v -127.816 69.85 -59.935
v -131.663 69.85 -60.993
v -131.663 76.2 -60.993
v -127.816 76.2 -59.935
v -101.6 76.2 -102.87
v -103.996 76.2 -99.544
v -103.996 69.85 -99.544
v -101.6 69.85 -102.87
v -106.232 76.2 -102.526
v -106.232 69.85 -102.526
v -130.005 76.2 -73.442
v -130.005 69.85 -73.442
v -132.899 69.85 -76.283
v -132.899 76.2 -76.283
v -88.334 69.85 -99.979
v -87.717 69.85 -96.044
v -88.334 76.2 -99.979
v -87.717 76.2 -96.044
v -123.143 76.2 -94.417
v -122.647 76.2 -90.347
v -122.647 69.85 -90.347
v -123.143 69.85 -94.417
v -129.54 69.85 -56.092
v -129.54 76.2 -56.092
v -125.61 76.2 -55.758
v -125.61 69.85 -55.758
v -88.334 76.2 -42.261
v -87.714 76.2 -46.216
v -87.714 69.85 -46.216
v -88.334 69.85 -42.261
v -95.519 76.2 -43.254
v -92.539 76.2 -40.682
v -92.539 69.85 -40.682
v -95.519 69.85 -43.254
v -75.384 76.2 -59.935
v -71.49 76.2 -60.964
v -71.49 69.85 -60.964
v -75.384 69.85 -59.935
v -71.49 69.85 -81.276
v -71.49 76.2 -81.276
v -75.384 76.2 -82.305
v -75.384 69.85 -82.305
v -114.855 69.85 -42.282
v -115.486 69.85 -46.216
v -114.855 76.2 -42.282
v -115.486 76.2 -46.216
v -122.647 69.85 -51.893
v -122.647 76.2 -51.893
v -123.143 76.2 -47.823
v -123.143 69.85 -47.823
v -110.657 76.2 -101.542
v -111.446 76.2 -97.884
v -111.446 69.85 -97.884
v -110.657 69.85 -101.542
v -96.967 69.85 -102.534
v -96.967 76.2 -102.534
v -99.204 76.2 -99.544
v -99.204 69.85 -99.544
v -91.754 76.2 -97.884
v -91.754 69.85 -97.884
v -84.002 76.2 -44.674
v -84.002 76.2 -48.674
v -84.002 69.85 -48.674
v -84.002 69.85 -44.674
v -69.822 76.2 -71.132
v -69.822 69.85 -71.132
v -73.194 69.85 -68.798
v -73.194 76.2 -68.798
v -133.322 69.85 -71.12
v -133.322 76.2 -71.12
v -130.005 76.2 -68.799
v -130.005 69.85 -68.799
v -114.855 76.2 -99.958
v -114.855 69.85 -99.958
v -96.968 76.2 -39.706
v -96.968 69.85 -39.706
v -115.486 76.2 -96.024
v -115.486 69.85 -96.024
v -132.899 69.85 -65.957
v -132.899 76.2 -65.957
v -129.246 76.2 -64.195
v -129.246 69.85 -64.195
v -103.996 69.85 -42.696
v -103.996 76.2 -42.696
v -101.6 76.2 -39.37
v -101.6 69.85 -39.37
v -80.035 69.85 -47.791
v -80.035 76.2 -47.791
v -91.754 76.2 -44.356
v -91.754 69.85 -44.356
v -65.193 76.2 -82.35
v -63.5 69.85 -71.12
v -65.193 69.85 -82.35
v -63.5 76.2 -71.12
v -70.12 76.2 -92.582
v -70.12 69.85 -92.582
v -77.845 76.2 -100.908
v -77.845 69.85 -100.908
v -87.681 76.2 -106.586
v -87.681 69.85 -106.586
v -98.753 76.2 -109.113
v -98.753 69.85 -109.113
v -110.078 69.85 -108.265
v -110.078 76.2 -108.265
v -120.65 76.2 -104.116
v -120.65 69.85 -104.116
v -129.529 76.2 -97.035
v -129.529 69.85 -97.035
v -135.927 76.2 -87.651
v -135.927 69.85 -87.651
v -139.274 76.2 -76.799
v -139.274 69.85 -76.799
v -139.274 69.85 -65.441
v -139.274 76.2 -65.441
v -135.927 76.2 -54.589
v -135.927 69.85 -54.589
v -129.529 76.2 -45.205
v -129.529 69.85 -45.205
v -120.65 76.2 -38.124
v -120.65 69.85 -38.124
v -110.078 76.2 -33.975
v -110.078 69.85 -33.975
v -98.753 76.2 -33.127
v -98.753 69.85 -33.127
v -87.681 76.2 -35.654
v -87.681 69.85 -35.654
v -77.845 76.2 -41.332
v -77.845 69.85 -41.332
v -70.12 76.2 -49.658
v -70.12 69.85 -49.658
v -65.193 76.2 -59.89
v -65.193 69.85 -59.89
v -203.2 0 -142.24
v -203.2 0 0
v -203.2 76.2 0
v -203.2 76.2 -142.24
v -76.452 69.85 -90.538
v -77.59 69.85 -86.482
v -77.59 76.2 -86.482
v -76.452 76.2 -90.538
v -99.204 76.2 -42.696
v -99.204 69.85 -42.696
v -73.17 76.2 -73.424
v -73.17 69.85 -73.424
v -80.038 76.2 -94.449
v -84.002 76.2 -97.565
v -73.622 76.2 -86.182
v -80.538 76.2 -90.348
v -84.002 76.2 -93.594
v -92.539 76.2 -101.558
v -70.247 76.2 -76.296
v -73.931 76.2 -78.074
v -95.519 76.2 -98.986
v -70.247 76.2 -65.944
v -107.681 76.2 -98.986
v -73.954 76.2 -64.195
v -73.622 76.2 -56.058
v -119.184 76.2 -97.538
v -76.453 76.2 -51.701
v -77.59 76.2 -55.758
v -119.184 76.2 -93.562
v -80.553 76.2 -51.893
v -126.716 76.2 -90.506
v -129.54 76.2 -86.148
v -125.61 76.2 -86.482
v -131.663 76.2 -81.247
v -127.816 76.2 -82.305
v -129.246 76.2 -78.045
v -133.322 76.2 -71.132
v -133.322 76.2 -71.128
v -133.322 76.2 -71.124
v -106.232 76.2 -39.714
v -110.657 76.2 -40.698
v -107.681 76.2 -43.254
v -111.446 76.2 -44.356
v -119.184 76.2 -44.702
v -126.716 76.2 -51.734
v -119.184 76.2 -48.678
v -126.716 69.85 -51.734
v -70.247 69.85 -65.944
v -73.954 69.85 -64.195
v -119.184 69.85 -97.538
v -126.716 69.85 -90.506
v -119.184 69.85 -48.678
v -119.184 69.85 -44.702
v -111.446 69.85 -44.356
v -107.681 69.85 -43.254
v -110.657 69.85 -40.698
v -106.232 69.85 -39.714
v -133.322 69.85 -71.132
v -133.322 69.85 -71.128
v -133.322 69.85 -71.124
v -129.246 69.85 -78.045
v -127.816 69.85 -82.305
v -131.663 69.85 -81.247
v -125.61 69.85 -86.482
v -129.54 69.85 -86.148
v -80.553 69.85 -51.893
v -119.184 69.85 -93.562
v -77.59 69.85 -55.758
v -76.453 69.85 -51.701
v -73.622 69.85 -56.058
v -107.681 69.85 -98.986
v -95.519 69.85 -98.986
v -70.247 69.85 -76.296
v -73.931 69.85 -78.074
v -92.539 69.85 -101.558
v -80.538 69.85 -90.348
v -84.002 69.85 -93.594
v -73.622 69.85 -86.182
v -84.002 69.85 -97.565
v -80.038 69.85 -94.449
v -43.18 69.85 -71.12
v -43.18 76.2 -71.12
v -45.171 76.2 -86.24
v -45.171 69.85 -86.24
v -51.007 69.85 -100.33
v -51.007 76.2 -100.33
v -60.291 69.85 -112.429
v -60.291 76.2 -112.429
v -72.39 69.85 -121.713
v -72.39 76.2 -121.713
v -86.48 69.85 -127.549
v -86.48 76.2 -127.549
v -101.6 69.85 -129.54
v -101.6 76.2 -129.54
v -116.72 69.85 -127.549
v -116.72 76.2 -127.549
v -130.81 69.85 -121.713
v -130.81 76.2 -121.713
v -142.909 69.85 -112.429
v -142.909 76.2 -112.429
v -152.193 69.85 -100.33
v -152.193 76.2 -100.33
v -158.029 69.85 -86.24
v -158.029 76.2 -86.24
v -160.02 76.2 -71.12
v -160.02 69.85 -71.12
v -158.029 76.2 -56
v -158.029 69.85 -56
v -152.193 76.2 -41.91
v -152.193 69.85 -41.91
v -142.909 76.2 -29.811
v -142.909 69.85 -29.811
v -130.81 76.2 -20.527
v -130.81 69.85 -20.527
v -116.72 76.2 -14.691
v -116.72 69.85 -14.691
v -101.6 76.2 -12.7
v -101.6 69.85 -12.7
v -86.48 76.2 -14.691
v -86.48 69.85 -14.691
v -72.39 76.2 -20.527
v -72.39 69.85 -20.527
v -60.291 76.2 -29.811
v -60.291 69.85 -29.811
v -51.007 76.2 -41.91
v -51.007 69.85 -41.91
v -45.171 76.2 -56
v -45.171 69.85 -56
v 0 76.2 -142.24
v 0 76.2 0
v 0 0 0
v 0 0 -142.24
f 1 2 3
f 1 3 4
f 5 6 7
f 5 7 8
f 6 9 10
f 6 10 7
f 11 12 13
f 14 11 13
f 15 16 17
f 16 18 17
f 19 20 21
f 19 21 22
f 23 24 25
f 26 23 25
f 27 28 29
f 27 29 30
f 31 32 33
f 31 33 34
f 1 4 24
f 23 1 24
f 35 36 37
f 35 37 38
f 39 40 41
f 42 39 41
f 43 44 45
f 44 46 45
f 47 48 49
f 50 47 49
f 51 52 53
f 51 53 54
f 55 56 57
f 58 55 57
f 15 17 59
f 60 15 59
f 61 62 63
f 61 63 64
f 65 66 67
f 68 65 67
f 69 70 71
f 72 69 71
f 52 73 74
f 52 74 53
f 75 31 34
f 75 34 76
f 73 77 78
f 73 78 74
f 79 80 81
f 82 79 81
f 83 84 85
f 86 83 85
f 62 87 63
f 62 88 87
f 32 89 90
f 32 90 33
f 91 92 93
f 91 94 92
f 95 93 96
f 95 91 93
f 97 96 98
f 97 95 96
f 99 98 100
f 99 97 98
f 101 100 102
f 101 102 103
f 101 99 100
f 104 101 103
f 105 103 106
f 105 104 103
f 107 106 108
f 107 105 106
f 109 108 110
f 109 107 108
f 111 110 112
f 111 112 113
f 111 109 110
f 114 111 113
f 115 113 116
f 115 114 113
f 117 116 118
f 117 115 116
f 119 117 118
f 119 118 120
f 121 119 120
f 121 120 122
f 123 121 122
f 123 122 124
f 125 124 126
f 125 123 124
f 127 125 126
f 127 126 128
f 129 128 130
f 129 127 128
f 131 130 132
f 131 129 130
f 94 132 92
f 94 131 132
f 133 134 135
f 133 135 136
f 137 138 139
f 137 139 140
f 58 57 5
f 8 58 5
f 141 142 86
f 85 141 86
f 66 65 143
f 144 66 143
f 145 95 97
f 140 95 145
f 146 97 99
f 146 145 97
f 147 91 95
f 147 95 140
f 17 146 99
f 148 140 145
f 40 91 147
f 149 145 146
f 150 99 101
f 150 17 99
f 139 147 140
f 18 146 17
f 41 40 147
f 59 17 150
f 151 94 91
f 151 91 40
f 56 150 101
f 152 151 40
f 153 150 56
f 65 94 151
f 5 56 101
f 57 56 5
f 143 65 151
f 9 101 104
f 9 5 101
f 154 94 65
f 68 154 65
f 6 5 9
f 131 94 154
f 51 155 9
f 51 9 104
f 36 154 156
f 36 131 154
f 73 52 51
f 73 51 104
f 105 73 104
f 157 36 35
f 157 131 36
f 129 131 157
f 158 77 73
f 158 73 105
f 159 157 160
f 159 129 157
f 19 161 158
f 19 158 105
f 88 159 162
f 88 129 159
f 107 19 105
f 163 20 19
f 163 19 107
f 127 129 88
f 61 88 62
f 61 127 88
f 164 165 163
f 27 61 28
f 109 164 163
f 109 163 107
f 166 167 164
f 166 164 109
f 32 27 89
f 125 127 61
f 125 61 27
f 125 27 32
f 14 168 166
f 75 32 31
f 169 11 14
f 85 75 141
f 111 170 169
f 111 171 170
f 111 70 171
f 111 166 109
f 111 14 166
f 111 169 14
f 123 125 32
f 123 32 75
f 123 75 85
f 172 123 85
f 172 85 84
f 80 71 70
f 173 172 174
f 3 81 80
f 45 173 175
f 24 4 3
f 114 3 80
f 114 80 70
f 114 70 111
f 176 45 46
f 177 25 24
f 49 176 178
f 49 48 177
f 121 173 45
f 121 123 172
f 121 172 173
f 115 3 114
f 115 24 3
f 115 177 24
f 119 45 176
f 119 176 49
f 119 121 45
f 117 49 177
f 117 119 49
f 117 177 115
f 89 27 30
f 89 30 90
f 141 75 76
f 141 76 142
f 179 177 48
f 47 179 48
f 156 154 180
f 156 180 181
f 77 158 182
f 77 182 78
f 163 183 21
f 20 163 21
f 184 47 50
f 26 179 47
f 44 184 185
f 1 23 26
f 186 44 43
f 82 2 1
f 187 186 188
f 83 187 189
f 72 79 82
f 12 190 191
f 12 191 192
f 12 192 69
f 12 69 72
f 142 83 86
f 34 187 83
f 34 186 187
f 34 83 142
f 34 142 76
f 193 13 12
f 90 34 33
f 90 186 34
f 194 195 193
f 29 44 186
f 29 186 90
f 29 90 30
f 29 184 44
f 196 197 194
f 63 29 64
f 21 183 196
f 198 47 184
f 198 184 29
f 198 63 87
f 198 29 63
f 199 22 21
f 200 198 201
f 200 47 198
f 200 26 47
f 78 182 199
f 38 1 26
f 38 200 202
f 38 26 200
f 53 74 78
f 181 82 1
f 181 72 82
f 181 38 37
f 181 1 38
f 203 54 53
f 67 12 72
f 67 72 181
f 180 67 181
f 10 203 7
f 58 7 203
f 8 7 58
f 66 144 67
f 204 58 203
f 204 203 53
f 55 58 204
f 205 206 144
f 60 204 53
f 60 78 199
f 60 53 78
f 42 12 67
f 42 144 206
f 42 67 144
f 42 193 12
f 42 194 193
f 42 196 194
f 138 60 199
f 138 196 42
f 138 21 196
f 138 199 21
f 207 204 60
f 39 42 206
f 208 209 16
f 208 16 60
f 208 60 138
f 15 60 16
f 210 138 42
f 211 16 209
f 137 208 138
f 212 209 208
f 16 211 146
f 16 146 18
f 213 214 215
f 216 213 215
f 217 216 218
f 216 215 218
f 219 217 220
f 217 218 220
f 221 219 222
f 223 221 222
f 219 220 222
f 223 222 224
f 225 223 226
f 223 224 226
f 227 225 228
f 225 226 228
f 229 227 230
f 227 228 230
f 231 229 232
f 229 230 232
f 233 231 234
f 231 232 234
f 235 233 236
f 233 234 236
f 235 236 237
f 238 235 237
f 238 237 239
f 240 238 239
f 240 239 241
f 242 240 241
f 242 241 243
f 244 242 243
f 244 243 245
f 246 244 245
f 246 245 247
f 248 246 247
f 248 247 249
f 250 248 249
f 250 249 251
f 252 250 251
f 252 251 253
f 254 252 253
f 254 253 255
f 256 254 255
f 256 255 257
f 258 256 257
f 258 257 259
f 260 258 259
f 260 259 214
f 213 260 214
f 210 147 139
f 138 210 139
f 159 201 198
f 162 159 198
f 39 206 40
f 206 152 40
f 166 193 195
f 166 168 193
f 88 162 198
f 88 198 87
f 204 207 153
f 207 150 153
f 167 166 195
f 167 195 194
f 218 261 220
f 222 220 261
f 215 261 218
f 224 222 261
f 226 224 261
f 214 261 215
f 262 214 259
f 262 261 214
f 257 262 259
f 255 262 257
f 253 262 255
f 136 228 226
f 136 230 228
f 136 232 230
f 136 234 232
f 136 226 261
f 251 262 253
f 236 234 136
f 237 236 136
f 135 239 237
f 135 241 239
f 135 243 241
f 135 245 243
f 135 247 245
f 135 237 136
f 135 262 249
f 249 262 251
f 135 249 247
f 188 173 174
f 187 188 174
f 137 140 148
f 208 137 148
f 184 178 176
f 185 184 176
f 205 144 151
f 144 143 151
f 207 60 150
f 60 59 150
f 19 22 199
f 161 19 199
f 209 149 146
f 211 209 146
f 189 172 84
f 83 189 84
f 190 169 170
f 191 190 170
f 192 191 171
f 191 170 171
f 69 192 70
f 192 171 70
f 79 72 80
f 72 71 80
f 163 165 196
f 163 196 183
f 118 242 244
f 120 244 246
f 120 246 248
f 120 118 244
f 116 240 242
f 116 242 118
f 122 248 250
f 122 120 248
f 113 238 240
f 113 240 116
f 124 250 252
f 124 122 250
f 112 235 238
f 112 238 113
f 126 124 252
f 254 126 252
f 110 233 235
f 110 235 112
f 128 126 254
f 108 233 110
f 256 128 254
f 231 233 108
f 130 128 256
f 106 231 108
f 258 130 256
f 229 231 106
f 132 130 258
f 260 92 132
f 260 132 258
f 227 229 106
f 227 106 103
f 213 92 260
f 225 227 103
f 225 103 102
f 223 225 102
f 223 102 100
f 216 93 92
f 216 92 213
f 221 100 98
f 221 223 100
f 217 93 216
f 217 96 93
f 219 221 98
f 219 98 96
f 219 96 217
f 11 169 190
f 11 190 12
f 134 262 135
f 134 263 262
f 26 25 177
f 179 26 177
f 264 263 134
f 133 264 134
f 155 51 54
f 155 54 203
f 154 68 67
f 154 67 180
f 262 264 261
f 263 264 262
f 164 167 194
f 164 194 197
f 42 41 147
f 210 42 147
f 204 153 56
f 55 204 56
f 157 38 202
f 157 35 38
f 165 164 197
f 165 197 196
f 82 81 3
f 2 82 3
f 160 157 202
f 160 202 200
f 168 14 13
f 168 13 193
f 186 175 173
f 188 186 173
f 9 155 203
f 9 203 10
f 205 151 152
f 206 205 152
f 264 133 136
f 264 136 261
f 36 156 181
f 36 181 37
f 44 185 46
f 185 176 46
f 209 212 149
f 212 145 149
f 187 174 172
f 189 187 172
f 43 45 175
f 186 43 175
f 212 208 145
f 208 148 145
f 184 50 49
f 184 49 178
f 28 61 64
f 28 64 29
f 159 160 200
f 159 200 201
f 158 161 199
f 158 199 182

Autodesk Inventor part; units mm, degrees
ref_plane "YZ Plane" through (0, 0, 0) normal (1, 0, 0) x (0, 1, 0)
ref_plane "XZ Plane" through (0, 0, 0) normal (0, 1, 0) x (-1, 0, 0)
ref_plane "XY Plane" through (0, 0, 0) normal (0, 0, 1) x (1, 0, 0)
sketch "Sketch1" plane through (0, 0, 0) normal (0, 1, 0) x (-1, 0, 0)
  line L0 (0, 0) -> (203.2, 0)
  line L1 (203.2, 0) -> (203.2, -142.24)
  line L2 (203.2, -142.24) -> (0, -142.24)
  line L3 (0, -142.24) -> (0, 0)
  dimension "d0" = 203.2
  dimension "d1" = 142.24
extrude "Extrusion1" add sketch "Sketch1" along normal blind 76.2
sketch "Sketch2" plane through (0, 76.2, 0) normal (0, 1, 0) x (1, 0, 0)
  line L0 (-203.2, 0) -> (0, 0) projected
  line L1 (-203.2, 0) -> (-203.2, 71.12)
  line L2 (-203.2, 142.24) -> (-203.2, 0) projected
  line L3 (0, 0) -> (0, 142.24) projected
  line L4 (0, 0) -> (-101.6, 0)
  circle A0 centre (-101.6, 71.12) radius 38.1
  circle A1 centre (-101.6, 71.12) radius 58.42
  circle A2 centre (-101.6, 71.12) radius 31.75
  line L5 (0, 142.24) -> (-203.2, 142.24) projected
  dimension "d4" = 71.12
  dimension "d6" = 101.6
  dimension "d7" = 76.2
  dimension "d8" = 116.84
  dimension "d9" = 63.5
  dimension "d10" = 71.12
extrude "Extrusion2" cut sketch "Sketch2" against normal blind 6.35 contours A1
sketch "Sketch3" plane through (0, 76.2, 0) normal (0, 1, 0) x (1, 0, 0)
  line L0 (0, 0) -> (-101.6, 0)
  line L1 (-203.2, 0) -> (0, 0) projected
  line L2 (0, 142.24) -> (-203.2, 142.24) projected
  line L3 (0, 0) -> (0, 142.24) projected
  circle A0 centre (-101.5719, 71.12) radius 31.75
  line L4 (-133.3219, 71.12) -> (-129.54, 71.12) construction
  line L5 (-130.036, 73.0239) -> (-126.4684, 73.0239) construction
  line L6 (-133.3219, 71.12) -> (-130.0051, 68.7994)
  line L7 (-130.0051, 68.7994) -> (-132.8994, 65.9574)
  line L8 (-133.3219, 71.1322) -> (-130.005, 73.442)
  line L9 (-130.005, 73.442) -> (-132.8994, 76.2826)
  line L10 (-132.8994, 76.2826) -> (-129.2464, 78.0447)
  line L11 (-129.2464, 78.0447) -> (-131.6634, 81.2473)
  line L12 (-131.6634, 81.2473) -> (-127.8155, 82.305)
  line L13 (-127.8155, 82.305) -> (-129.54, 86.1483)
  line L14 (-129.54, 86.1483) -> (-125.61, 86.4823)
  line L15 (-125.61, 86.4823) -> (-126.7161, 90.5064)
  line L16 (-126.7161, 90.5064) -> (-122.6466, 90.3473)
  line L17 (-122.6466, 90.3473) -> (-123.1432, 94.4168)
  line L18 (-123.1432, 94.4168) -> (-119.1835, 93.5625)
  line L19 (-119.1835, 93.5625) -> (-119.1835, 97.5377)
  line L20 (-119.1835, 97.5377) -> (-115.486, 96.0244)
  line L21 (-115.486, 96.0244) -> (-114.8554, 99.9577)
  line L22 (-114.8554, 99.9577) -> (-111.4463, 97.8843)
  line L23 (-111.4463, 97.8843) -> (-110.657, 101.5424)
  line L24 (-110.657, 101.5424) -> (-107.6807, 98.986)
  line L25 (-107.6807, 98.986) -> (-106.2317, 102.5262)
  line L26 (-106.2317, 102.5262) -> (-103.9961, 99.5445)
  line L27 (-103.9961, 99.5445) -> (-101.6, 102.87)
  line L28 (-130.005, 68.798) -> (-132.8994, 65.9574)
  line L29 (-132.8994, 65.9574) -> (-129.2464, 64.1953)
  line L30 (-129.2464, 64.1953) -> (-131.6634, 60.9927)
  line L31 (-131.6634, 60.9927) -> (-127.8155, 59.935)
  line L32 (-127.8155, 59.935) -> (-129.54, 56.0917)
  line L33 (-129.54, 56.0917) -> (-125.61, 55.7577)
  line L34 (-125.61, 55.7577) -> (-126.7161, 51.7336)
  line L35 (-126.7161, 51.7336) -> (-122.6466, 51.8927)
  line L36 (-122.6466, 51.8927) -> (-123.1432, 47.8232)
  line L37 (-123.1432, 47.8232) -> (-119.1835, 48.6775)
  line L38 (-119.1835, 48.6775) -> (-119.1835, 44.7023)
  line L39 (-119.1835, 44.7023) -> (-115.486, 46.2156)
  line L40 (-115.486, 46.2156) -> (-114.8554, 42.2823)
  line L41 (-114.8554, 42.2823) -> (-111.4463, 44.3557)
  line L42 (-111.4463, 44.3557) -> (-110.657, 40.6976)
  line L43 (-110.657, 40.6976) -> (-107.6807, 43.254)
  line L44 (-107.6807, 43.254) -> (-106.2317, 39.7138)
  line L45 (-106.2317, 39.7138) -> (-103.9961, 42.6955)
  line L46 (-103.9961, 42.6955) -> (-101.6, 39.37)
  line L47 (-73.1943, 68.7985) -> (-70.2466, 65.9445)
  line L48 (-69.8219, 71.1322) -> (-73.1695, 73.4245)
  line L49 (-73.1695, 73.4245) -> (-70.2466, 76.2955)
  line L50 (-70.2466, 76.2955) -> (-73.9311, 78.0745)
  line L51 (-73.9311, 78.0745) -> (-71.4902, 81.2764)
  line L52 (-71.4902, 81.2764) -> (-75.3845, 82.305)
  line L53 (-75.3845, 82.305) -> (-73.6219, 86.1817)
  line L54 (-73.6219, 86.1817) -> (-77.59, 86.4823)
  line L55 (-77.59, 86.4823) -> (-76.4523, 90.5383)
  line L56 (-76.4523, 90.5383) -> (-80.5385, 90.348)
  line L57 (-80.5385, 90.348) -> (-80.038, 94.449)
  line L58 (-80.038, 94.449) -> (-84.0015, 93.5938)
  line L59 (-84.0015, 93.5938) -> (-84.0015, 97.5649)
  line L60 (-84.0015, 97.5649) -> (-87.7172, 96.0441)
  line L61 (-87.7172, 96.0441) -> (-88.3345, 99.9789)
  line L62 (-88.3345, 99.9789) -> (-91.7537, 97.8843)
  line L63 (-91.7537, 97.8843) -> (-92.5392, 101.558)
  line L64 (-92.5392, 101.558) -> (-95.5193, 98.986)
  line L65 (-95.5193, 98.986) -> (-96.9668, 102.5343)
  line L66 (-96.9668, 102.5343) -> (-99.2039, 99.5445)
  line L67 (-99.2039, 99.5445) -> (-101.6, 102.87)
  line L68 (-69.8219, 71.1322) -> (-73.195, 68.798)
  line L69 (-73.195, 68.798) -> (-70.2466, 65.9445)
  line L70 (-70.2466, 65.9445) -> (-73.9536, 64.1953)
  line L71 (-73.9536, 64.1953) -> (-71.4902, 60.9636)
  line L72 (-71.4902, 60.9636) -> (-75.3845, 59.935)
  line L73 (-75.3845, 59.935) -> (-73.6219, 56.0583)
  line L74 (-73.6219, 56.0583) -> (-77.59, 55.7577)
  line L75 (-76.4527, 51.701) -> (-80.5534, 51.8927)
  line L76 (-77.59, 55.7577) -> (-76.4527, 51.701)
  line L77 (-80.5534, 51.8927) -> (-80.0351, 47.7913)
  line L78 (-80.0351, 47.7913) -> (-84.0015, 48.6742)
  line L79 (-84.0015, 48.6742) -> (-84.0015, 44.6736)
  line L80 (-84.0015, 44.6736) -> (-87.714, 46.2156)
  line L81 (-87.714, 46.2156) -> (-88.3345, 42.2611)
  line L82 (-88.3345, 42.2611) -> (-91.7537, 44.3557)
  line L83 (-91.7537, 44.3557) -> (-92.5392, 40.682)
  line L84 (-92.5392, 40.682) -> (-95.5193, 43.254)
  line L85 (-95.5193, 43.254) -> (-96.9683, 39.7055)
  line L86 (-96.9683, 39.7055) -> (-99.2039, 42.6955)
  line L87 (-99.2039, 42.6955) -> (-101.6, 39.37)
  line L88 (-133.3219, 71.1322) -> (-130.005, 68.798)
  line L89 (-130.005, 68.798) -> (-132.8994, 65.9574)
  line L90 (-132.8994, 65.9574) -> (-129.2464, 64.1953)
  line L91 (-129.2464, 64.1953) -> (-131.6634, 60.9927)
  line L92 (-131.6634, 60.9927) -> (-127.8155, 59.935)
  line L93 (-127.8155, 59.935) -> (-129.54, 56.0917)
  line L94 (-126.7161, 51.7336) -> (-122.6466, 51.8927)
  line L95 (-122.6466, 51.8927) -> (-123.1432, 47.8232)
  line L96 (-123.1432, 47.8232) -> (-119.1835, 48.6775)
  line L97 (-119.1835, 48.6775) -> (-119.1835, 44.7023)
  line L98 (-119.1835, 44.7023) -> (-115.486, 46.2156)
  line L99 (-115.486, 46.2156) -> (-114.8554, 42.2823)
  line L100 (-114.8554, 42.2823) -> (-111.4463, 44.3557)
  line L101 (-111.4463, 44.3557) -> (-110.657, 40.6976)
  line L102 (-107.6807, 43.254) -> (-110.657, 40.6976)
  line L103 (-107.6807, 43.254) -> (-106.2317, 39.7138)
  line L104 (-106.2317, 39.7138) -> (-103.9961, 42.6955)
  line L105 (-103.9961, 42.6955) -> (-101.6, 39.37)
  line L106 (-101.6, 39.37) -> (-99.2039, 42.6955)
  line L107 (-99.2039, 42.6955) -> (-96.9683, 39.7055)
  line L108 (-96.9683, 39.7055) -> (-95.5193, 43.254)
  line L109 (-95.5193, 43.254) -> (-92.5392, 40.682)
  line L110 (-92.5392, 40.682) -> (-91.7537, 44.3557)
  line L111 (-91.7537, 44.3557) -> (-88.3345, 42.2611)
  line L112 (-129.2464, 78.0447) -> (-131.6634, 81.2473)
  line L113 (-131.6634, 81.2473) -> (-127.8155, 82.305)
  line L114 (-129.54, 86.1483) -> (-127.8155, 82.305)
  line L115 (-129.54, 86.1483) -> (-125.61, 86.4823)
  line L116 (-125.61, 86.4823) -> (-126.7161, 90.5064)
  line L117 (-71.4902, 81.2764) -> (-73.9311, 78.0745)
  line L118 (-73.9311, 78.0745) -> (-70.2466, 76.2955)
  line L119 (-70.2466, 76.2955) -> (-73.1695, 73.4245)
  line L120 (-73.1695, 73.4245) -> (-69.8219, 71.1322)
  line L121 (-69.8219, 71.1322) -> (-73.1943, 68.7985)
  line L122 (-73.1943, 68.7985) -> (-70.2466, 65.9445)
  line L123 (-70.2466, 65.9445) -> (-73.9536, 64.1953)
  line L124 (-73.9536, 64.1953) -> (-71.4902, 60.9636)
  line L125 (-71.4902, 60.9636) -> (-75.3845, 59.935)
  line L126 (-75.3845, 59.935) -> (-73.6219, 56.0583)
  line L127 (-75.3845, 59.935) -> (-73.6219, 56.0583)
  line L128 (-73.6219, 56.0583) -> (-77.59, 55.7577)
  line L129 (-70.2466, 65.9445) -> (-73.1943, 68.7985)
  line L130 (-73.1943, 68.7985) -> (-69.8219, 71.1322)
  line L131 (-69.8219, 71.1322) -> (-73.1695, 73.4245)
  line L132 (-73.1695, 73.4245) -> (-70.2466, 76.2955)
  line L133 (-70.2466, 76.2955) -> (-73.9311, 78.0745)
  line L134 (-71.4902, 60.9636) -> (-73.9536, 64.1953)
  line L135 (-73.9536, 64.1953) -> (-70.2466, 65.9445)
  line L136 (-70.2466, 65.9445) -> (-73.1943, 68.7985)
  line L137 (-73.1943, 68.7985) -> (-70.2466, 65.9445)
  line L138 (-73.1943, 68.7985) -> (-69.8219, 71.1322)
  line L139 (-69.8219, 71.1322) -> (-73.1695, 73.4245)
  line L140 (-73.1695, 73.4245) -> (-70.2466, 76.2955)
  line L141 (-70.2466, 76.2955) -> (-73.9311, 78.0745)
  line L142 (-69.8219, 71.1322) -> (-73.1695, 73.4245)
  line L143 (-71.4902, 81.2764) -> (-75.3845, 82.305)
  line L144 (-75.3845, 82.305) -> (-73.6219, 86.1817)
  line L145 (-73.6219, 86.1817) -> (-77.59, 86.4823)
  line L146 (-77.59, 86.4823) -> (-76.4523, 90.5383)
  line L147 (-73.6219, 86.1817) -> (-77.59, 86.4823)
  line L148 (-80.5385, 90.348) -> (-76.4523, 90.5383)
  line L149 (-71.4902, 81.2764) -> (-73.9311, 78.0745)
  line L150 (-131.6634, 81.2473) -> (-127.8155, 82.305)
  line L151 (-127.8155, 82.305) -> (-129.54, 86.1483)
  line L152 (-129.54, 86.1483) -> (-127.8155, 82.305)
  line L153 (-129.54, 86.1483) -> (-125.61, 86.4823)
  line L154 (-125.61, 86.4823) -> (-126.7161, 90.5064)
  line L155 (-126.7161, 90.5064) -> (-122.6466, 90.3473)
  line L156 (-122.6466, 90.3473) -> (-123.1432, 94.4168)
  line L157 (-123.1432, 94.4168) -> (-122.6466, 90.3473)
  line L158 (-123.1432, 94.4168) -> (-119.1835, 93.5625)
  line L159 (-119.1835, 93.5625) -> (-119.1835, 97.5377)
  line L160 (-119.1835, 97.5377) -> (-115.486, 96.0244)
  line L161 (-115.486, 96.0244) -> (-114.8554, 99.9577)
  line L162 (-114.8554, 99.9577) -> (-111.4463, 97.8843)
  dimension "d13" = 63.5
  dimension "d27" = 69.832
  dimension "d28" = 70.214
  dimension "d29" = 79.316
  dimension "d30" = 78.709
  dimension "d31" = 77.824
extrude "Extrusion3" cut sketch "Sketch3" against normal blind 6.35 contours L68 L47 L70 L71 L72 L73 L74 L76 L75 L77 L78 L79 L80 L81 L82 L83 L84 L85 L86 L87 L46 L45 L44 L43 L42 L41 L40 L39 L38 L37 L36 L35 L34 L33 L32 L31 L30 L29 L7 L88 L8 L9 L10 L11 L12 L13 L14 L15 L16 L17 L18 L19 L20 L21 L22 L23 L24 L25 L26 L27 L67 L66 L65 L64 L63 L62 L61 L60 L59 L58 L57 L56 L55 L54 L53 L52 L51 L50 L49 L48 | A0 L88 L6
